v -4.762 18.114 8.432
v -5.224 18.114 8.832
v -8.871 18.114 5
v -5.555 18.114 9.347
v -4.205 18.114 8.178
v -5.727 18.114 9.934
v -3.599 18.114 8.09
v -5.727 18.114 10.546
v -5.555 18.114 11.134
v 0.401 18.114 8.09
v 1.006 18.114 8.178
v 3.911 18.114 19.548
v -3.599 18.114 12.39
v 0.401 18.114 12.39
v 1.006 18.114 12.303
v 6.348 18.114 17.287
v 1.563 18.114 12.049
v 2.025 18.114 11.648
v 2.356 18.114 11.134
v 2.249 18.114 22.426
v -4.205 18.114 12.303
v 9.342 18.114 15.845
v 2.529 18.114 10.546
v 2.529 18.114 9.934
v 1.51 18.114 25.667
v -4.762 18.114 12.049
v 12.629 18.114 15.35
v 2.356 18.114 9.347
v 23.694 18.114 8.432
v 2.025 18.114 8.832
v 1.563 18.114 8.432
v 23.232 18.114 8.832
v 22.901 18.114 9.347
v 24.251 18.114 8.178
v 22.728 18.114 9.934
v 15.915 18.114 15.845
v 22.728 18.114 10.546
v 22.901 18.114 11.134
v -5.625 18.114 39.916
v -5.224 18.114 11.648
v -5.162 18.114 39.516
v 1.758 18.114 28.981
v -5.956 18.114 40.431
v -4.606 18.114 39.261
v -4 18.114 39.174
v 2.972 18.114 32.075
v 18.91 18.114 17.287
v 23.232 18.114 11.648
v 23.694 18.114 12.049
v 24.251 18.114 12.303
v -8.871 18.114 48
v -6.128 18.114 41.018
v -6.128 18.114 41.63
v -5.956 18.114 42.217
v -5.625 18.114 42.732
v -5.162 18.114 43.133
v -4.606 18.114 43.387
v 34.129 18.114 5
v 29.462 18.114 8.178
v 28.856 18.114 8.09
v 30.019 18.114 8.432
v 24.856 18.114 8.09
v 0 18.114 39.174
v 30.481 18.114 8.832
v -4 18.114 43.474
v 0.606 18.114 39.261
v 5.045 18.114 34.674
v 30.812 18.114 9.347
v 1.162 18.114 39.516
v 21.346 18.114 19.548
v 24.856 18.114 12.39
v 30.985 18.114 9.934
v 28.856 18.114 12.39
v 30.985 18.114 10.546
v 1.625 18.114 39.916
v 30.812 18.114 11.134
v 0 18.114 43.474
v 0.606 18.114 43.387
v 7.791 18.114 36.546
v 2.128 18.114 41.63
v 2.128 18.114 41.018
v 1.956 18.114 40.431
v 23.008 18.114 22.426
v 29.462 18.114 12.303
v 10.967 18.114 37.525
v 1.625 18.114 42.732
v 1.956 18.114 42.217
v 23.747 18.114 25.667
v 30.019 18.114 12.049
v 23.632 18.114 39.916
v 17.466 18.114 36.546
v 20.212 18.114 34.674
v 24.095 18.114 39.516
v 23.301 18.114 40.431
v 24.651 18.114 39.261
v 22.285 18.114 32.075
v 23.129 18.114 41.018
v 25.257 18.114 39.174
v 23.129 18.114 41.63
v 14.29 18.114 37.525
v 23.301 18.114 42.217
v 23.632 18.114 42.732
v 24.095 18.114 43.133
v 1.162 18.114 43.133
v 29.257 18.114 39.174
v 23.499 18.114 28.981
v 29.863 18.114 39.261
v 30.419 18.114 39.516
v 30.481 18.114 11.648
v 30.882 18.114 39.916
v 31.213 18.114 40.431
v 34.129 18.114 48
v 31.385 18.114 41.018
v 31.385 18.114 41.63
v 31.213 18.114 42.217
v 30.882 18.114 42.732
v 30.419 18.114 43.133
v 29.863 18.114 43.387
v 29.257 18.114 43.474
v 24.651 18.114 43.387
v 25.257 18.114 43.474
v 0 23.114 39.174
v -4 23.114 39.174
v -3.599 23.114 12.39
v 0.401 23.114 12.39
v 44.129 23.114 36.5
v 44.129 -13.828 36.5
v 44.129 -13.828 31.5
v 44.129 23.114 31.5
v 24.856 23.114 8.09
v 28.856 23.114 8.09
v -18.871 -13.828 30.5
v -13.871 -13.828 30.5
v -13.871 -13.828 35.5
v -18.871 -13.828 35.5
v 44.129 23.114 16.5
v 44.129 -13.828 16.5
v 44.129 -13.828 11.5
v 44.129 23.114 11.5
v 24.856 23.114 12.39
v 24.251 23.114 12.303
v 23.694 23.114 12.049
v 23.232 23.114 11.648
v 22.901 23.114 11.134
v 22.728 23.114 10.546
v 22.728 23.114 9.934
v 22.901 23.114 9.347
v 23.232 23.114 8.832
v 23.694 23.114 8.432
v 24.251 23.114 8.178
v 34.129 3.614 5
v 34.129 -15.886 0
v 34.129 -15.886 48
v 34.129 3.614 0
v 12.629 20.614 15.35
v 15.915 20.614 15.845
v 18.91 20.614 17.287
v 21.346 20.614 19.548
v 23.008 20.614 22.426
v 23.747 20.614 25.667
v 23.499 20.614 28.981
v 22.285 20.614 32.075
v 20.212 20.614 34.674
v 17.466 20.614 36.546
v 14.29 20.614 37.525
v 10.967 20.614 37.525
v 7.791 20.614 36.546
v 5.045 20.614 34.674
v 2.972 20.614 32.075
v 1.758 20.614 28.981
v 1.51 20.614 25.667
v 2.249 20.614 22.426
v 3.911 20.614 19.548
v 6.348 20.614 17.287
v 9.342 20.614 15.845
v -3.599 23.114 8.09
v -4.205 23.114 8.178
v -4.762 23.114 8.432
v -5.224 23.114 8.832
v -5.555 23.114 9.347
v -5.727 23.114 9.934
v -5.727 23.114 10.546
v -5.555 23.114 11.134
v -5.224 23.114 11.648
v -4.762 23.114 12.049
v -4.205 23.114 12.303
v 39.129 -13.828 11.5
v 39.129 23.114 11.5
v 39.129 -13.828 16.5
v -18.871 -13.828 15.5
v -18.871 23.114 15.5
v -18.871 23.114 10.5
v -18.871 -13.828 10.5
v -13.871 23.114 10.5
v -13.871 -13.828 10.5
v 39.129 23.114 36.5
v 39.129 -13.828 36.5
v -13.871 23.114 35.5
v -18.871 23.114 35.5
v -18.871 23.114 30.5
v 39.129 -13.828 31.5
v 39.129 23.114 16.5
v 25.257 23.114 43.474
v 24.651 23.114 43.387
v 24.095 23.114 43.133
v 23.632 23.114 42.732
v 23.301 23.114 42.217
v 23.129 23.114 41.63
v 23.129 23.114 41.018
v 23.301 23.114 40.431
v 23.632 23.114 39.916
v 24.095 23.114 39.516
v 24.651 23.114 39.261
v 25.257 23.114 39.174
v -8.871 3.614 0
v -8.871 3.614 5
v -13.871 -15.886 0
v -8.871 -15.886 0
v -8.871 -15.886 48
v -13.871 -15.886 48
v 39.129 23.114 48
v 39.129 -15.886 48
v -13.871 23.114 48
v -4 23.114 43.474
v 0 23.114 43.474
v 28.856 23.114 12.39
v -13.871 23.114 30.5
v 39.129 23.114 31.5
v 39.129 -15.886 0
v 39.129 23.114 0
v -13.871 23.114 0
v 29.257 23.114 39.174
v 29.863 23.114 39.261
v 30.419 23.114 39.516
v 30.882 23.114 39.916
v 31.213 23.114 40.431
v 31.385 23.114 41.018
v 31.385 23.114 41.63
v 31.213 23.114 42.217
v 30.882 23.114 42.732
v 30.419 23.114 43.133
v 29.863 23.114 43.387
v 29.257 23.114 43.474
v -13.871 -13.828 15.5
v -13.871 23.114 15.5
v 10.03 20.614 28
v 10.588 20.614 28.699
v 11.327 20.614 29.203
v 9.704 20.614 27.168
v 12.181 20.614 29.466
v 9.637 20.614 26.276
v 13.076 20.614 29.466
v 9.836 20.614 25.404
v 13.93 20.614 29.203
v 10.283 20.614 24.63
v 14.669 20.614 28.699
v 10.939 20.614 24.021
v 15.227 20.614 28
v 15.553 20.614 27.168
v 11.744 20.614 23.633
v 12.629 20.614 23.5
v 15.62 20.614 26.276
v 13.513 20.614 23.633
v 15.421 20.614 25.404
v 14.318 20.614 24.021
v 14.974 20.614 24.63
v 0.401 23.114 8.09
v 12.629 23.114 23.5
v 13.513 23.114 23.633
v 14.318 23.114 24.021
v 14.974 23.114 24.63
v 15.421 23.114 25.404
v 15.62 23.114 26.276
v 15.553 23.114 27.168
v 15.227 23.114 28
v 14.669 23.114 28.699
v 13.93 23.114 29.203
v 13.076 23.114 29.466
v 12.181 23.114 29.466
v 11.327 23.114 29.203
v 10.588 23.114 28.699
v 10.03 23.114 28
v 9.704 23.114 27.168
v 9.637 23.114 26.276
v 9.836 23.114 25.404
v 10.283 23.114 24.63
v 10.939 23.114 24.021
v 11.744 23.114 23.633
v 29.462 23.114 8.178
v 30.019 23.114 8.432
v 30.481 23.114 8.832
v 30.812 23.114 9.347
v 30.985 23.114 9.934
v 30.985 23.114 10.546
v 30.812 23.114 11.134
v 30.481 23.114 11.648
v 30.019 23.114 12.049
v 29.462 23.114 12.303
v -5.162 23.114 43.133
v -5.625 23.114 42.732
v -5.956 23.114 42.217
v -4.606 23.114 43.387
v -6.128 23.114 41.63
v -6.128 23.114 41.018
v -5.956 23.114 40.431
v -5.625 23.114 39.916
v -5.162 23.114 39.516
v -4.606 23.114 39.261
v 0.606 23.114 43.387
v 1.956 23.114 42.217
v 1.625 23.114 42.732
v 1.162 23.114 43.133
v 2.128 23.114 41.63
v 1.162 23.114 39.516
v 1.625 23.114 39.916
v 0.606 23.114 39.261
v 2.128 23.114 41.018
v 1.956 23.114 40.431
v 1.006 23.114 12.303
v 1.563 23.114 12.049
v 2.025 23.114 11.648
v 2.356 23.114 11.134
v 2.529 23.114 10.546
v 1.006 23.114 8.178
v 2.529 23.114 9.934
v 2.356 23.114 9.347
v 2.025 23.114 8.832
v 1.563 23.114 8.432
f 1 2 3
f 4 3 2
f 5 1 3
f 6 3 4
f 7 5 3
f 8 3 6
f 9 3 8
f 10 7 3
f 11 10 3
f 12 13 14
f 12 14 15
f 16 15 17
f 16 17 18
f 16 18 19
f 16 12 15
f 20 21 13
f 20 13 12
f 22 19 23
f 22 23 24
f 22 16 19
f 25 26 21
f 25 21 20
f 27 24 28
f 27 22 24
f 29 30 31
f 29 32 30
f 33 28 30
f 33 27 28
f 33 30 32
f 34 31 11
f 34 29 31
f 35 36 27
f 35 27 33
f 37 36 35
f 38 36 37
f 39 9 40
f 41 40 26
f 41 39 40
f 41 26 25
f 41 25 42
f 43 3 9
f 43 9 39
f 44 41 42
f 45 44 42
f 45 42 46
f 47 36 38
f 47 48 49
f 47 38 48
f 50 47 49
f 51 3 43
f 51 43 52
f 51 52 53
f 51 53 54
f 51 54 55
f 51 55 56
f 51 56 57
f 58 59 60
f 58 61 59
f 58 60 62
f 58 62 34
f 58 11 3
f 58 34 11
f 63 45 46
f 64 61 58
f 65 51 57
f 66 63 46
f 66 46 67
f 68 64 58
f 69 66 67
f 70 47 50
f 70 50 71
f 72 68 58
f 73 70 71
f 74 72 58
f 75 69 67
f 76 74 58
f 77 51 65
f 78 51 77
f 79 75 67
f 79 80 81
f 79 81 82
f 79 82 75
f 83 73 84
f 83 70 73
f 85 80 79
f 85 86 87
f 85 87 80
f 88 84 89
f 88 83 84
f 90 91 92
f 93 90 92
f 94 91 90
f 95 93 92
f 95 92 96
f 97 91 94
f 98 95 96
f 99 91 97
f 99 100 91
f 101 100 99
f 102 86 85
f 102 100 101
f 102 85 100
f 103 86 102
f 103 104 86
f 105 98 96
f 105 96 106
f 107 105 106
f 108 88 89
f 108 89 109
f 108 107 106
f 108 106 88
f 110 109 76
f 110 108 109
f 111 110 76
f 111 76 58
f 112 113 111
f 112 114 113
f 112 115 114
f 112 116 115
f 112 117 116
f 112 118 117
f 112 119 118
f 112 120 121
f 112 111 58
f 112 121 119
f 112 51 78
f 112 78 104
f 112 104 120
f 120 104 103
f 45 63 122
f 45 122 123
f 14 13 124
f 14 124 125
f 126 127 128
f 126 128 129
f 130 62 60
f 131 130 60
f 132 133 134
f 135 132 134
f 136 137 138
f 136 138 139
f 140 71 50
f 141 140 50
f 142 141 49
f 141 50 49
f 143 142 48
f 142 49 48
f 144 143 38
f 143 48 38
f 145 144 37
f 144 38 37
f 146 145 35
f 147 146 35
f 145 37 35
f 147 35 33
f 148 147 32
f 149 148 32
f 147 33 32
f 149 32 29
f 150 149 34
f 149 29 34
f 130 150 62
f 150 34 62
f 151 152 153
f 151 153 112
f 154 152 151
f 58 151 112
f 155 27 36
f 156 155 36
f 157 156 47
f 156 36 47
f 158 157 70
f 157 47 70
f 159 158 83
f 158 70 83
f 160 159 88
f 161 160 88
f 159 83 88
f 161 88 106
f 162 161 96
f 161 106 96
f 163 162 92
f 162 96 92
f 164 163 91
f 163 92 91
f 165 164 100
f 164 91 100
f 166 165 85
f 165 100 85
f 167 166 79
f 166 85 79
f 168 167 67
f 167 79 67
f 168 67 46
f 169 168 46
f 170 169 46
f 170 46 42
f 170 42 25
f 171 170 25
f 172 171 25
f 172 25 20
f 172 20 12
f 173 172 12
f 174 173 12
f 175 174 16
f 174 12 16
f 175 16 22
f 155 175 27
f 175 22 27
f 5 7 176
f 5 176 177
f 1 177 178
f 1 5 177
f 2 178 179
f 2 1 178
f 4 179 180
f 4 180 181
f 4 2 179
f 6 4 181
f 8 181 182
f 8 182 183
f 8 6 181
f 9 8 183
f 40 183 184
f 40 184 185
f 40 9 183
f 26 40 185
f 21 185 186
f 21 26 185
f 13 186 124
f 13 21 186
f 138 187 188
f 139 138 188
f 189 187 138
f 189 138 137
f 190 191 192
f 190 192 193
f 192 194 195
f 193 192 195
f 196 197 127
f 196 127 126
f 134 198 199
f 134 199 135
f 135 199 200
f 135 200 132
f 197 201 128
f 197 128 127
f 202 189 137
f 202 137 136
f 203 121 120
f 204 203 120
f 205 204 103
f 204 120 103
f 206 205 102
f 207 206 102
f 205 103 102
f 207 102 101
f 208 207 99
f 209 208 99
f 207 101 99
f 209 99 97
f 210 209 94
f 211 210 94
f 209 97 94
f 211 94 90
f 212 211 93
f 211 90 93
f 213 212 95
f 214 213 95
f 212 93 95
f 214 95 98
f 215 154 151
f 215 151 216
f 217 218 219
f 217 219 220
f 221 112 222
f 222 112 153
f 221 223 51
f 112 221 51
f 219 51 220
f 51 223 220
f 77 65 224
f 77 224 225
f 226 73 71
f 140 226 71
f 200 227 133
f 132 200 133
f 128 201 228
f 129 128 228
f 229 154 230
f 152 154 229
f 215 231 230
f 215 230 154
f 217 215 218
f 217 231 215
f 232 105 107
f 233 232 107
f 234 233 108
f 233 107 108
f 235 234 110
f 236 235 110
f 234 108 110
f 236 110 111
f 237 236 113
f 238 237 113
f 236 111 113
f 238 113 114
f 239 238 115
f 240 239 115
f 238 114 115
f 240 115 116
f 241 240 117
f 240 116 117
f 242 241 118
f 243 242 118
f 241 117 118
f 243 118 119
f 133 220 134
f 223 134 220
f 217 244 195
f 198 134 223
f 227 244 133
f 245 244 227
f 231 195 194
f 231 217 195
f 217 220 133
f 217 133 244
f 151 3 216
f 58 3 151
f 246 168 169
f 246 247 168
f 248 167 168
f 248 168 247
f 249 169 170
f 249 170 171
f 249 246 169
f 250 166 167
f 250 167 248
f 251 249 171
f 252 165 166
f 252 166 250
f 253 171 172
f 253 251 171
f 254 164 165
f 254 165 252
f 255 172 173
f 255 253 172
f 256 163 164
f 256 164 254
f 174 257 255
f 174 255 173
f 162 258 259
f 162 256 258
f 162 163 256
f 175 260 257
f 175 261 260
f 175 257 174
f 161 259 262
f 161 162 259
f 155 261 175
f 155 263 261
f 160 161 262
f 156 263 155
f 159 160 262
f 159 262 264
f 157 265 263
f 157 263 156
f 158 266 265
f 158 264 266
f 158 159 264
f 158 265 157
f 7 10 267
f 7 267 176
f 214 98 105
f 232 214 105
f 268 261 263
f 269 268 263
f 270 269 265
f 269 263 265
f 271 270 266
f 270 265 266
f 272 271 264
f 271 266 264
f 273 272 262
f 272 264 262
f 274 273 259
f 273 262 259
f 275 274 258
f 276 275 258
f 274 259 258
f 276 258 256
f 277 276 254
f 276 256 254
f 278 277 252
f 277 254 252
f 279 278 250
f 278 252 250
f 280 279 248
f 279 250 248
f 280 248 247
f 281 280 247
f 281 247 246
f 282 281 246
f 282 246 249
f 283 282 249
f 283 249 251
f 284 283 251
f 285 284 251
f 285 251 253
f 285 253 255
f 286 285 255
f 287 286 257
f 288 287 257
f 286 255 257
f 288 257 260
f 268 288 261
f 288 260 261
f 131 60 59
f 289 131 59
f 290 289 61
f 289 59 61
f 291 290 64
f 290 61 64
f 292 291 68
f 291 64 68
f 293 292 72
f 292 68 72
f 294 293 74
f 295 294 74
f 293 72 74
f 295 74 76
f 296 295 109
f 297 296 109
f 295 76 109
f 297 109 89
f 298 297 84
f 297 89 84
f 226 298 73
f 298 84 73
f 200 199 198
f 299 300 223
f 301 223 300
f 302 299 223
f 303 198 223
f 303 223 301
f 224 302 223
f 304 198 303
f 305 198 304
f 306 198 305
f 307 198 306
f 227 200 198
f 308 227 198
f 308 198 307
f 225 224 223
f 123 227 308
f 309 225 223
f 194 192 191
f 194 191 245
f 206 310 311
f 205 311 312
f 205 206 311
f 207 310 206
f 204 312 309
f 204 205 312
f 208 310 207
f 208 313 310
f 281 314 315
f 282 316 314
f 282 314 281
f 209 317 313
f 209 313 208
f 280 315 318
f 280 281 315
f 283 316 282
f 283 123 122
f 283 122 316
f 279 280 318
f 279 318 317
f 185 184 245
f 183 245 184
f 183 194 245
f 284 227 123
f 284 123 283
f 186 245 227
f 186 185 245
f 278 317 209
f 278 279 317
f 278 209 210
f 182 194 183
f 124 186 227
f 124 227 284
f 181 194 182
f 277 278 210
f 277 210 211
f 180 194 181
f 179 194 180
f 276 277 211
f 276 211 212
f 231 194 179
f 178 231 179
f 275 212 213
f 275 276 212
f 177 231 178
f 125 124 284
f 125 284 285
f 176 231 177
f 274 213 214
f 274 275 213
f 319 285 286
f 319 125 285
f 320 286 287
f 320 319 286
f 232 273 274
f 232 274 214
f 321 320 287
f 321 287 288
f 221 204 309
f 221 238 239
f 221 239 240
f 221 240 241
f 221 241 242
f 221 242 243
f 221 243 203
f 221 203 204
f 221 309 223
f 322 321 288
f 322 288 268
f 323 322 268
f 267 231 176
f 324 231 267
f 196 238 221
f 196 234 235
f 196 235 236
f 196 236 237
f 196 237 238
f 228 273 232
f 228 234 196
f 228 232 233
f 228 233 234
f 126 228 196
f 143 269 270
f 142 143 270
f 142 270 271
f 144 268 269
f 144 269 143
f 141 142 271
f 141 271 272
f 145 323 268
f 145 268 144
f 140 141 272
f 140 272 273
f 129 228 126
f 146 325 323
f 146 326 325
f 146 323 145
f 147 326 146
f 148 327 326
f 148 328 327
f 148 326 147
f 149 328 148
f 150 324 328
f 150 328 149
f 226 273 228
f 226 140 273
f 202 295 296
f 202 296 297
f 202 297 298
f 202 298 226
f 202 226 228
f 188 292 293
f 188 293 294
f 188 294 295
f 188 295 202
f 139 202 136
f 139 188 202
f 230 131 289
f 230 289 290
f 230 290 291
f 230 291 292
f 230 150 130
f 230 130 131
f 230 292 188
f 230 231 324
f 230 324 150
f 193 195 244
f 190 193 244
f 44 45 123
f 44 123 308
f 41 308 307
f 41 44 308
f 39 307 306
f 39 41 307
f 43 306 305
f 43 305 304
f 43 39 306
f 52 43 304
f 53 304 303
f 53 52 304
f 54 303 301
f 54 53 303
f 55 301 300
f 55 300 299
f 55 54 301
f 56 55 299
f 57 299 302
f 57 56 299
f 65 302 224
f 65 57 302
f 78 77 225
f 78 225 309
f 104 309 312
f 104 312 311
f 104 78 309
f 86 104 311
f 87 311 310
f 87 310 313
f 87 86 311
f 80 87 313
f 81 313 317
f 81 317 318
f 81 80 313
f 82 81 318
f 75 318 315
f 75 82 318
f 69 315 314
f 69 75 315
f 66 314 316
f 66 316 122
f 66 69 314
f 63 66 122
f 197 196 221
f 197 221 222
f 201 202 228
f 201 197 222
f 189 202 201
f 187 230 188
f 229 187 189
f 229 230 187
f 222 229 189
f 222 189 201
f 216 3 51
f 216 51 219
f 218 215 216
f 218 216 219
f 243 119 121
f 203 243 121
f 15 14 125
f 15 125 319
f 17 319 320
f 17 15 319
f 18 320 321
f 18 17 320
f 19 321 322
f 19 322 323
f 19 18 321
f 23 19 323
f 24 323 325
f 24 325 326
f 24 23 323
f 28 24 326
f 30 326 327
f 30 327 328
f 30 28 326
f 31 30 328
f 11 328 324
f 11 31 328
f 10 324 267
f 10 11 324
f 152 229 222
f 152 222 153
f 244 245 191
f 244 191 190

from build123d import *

# Parameters (mm, degrees)
BOSS_EXTRUDE4_DEPTH = 48
SKETCH2_W           = 43
SKETCH2_H           = 43
CUT_EXTRUDE2_DEPTH  = 43
SKETCH5_R           = 11.15
CUT_EXTRUDE3_DEPTH  = 2.5
SKETCH7_R           = 3
CUT_EXTRUDE4_DEPTH  = 2.5
CUT_EXTRUDE5_DEPTH  = 5
SKETCH9_W           = 36.942088093
SKETCH9_H           = 5
BOSS_EXTRUDE5_DEPTH = 5
SKETCH12_W          = 36.942088093
SKETCH12_H          = 5
BOSS_EXTRUDE6_DEPTH = 5


with BuildPart() as part:
    # Sketch1 → Boss-Extrude4 (new body)
    with BuildSketch(Plane(origin=(0, 0, 0), x_dir=(0, 1, 0), z_dir=(0, 0, 1))):
        Polygon((3.614394585, 8.871473005), (-15.885605415, 8.871473005), (-15.885605415, 13.871473005), (23.114394585, 13.871473005), (23.114394585, -39.128526995), (-15.885605415, -39.128526995), (-15.885605415, -34.128526995), (3.614394585, -34.128526995), align=None)
    extrude(amount=BOSS_EXTRUDE4_DEPTH)

    # Sketch2 → Cut-Extrude2 (cut)
    with BuildSketch(Plane.XY.offset(48)):
        with Locations((12.628526995, -3.385605415)):
            Rectangle(SKETCH2_W, SKETCH2_H)
    extrude(amount=-CUT_EXTRUDE2_DEPTH, mode=Mode.SUBTRACT)

    # Sketch5 → Cut-Extrude3 (cut)
    with BuildSketch(Plane.XZ.offset(-18.114394585)):
        with Locations(Location((12.628526995, 26.5, 0), (0, 0, 270))):
            Circle(SKETCH5_R)
    extrude(amount=-CUT_EXTRUDE3_DEPTH, mode=Mode.SUBTRACT)

    # Sketch7 → Cut-Extrude4 (cut)
    with BuildSketch(Plane.XZ.offset(-20.614394585)):
        with Locations(Location((12.628526995, 26.5, 0), (0, 0, 270))):
            Circle(SKETCH7_R)
    extrude(amount=-CUT_EXTRUDE4_DEPTH, mode=Mode.SUBTRACT)

    # Sketch8 → Cut-Extrude5 (cut)
    with BuildSketch(Plane.XZ.offset(-18.114394585)):
        with BuildLine():
            Line((-4, 43.474351547), (0, 43.474351547))
            ThreePointArc((0, 43.474351547), (2.15, 41.324351547), (0, 39.174351547))
            Line((0, 39.174351547), (-4, 39.174351547))
            ThreePointArc((-4, 39.174351547), (-6.15, 41.324351547), (-4, 43.474351547))
        make_face()
        with BuildLine():
            Line((28.856423603, 12.390432875), (24.856423603, 12.390432875))
            ThreePointArc((24.856423603, 12.390432875), (22.706423603, 10.240432875), (24.856423603, 8.090432875))
            Line((24.856423603, 8.090432875), (28.856423603, 8.090432875))
            ThreePointArc((28.856423603, 8.090432875), (31.006423603, 10.240432875), (28.856423603, 12.390432875))
        make_face()
        with BuildLine():
            Line((29.25705399, 43.474351547), (25.25705399, 43.474351547))
            ThreePointArc((25.25705399, 43.474351547), (23.10705399, 41.324351547), (25.25705399, 39.174351547))
            Line((25.25705399, 39.174351547), (29.25705399, 39.174351547))
            ThreePointArc((29.25705399, 39.174351547), (31.40705399, 41.324351547), (29.25705399, 43.474351547))
        make_face()
        with BuildLine():
            Line((-3.599369613, 12.390432875), (0.400630387, 12.390432875))
            ThreePointArc((0.400630387, 12.390432875), (2.550630387, 10.240432875), (0.400630387, 8.090432875))
            Line((0.400630387, 8.090432875), (-3.599369613, 8.090432875))
            ThreePointArc((-3.599369613, 8.090432875), (-5.749369613, 10.240432875), (-3.599369613, 12.390432875))
        make_face()
    extrude(amount=-CUT_EXTRUDE5_DEPTH, mode=Mode.SUBTRACT)

    # Sketch9 → Boss-Extrude5 (add)
    with BuildSketch(Plane(origin=(-13.871473005, 0, 0), x_dir=(0, -1, 0), z_dir=(-1, 0, 0))):
        with Locations((-4.643350539, 33)):
            Rectangle(SKETCH9_W, SKETCH9_H)
        with Locations((-4.643350539, 13)):
            Rectangle(SKETCH9_W, SKETCH9_H)
    extrude(amount=BOSS_EXTRUDE5_DEPTH)

    # Sketch12 → Boss-Extrude6 (add)
    with BuildSketch(Plane.YZ.offset(39.128526995)):
        with Locations((4.643350539, 34)):
            Rectangle(SKETCH12_W, SKETCH12_H)
        with Locations((4.643350539, 14)):
            Rectangle(SKETCH12_W, SKETCH12_H)
    extrude(amount=BOSS_EXTRUDE6_DEPTH)


solid = part.part
